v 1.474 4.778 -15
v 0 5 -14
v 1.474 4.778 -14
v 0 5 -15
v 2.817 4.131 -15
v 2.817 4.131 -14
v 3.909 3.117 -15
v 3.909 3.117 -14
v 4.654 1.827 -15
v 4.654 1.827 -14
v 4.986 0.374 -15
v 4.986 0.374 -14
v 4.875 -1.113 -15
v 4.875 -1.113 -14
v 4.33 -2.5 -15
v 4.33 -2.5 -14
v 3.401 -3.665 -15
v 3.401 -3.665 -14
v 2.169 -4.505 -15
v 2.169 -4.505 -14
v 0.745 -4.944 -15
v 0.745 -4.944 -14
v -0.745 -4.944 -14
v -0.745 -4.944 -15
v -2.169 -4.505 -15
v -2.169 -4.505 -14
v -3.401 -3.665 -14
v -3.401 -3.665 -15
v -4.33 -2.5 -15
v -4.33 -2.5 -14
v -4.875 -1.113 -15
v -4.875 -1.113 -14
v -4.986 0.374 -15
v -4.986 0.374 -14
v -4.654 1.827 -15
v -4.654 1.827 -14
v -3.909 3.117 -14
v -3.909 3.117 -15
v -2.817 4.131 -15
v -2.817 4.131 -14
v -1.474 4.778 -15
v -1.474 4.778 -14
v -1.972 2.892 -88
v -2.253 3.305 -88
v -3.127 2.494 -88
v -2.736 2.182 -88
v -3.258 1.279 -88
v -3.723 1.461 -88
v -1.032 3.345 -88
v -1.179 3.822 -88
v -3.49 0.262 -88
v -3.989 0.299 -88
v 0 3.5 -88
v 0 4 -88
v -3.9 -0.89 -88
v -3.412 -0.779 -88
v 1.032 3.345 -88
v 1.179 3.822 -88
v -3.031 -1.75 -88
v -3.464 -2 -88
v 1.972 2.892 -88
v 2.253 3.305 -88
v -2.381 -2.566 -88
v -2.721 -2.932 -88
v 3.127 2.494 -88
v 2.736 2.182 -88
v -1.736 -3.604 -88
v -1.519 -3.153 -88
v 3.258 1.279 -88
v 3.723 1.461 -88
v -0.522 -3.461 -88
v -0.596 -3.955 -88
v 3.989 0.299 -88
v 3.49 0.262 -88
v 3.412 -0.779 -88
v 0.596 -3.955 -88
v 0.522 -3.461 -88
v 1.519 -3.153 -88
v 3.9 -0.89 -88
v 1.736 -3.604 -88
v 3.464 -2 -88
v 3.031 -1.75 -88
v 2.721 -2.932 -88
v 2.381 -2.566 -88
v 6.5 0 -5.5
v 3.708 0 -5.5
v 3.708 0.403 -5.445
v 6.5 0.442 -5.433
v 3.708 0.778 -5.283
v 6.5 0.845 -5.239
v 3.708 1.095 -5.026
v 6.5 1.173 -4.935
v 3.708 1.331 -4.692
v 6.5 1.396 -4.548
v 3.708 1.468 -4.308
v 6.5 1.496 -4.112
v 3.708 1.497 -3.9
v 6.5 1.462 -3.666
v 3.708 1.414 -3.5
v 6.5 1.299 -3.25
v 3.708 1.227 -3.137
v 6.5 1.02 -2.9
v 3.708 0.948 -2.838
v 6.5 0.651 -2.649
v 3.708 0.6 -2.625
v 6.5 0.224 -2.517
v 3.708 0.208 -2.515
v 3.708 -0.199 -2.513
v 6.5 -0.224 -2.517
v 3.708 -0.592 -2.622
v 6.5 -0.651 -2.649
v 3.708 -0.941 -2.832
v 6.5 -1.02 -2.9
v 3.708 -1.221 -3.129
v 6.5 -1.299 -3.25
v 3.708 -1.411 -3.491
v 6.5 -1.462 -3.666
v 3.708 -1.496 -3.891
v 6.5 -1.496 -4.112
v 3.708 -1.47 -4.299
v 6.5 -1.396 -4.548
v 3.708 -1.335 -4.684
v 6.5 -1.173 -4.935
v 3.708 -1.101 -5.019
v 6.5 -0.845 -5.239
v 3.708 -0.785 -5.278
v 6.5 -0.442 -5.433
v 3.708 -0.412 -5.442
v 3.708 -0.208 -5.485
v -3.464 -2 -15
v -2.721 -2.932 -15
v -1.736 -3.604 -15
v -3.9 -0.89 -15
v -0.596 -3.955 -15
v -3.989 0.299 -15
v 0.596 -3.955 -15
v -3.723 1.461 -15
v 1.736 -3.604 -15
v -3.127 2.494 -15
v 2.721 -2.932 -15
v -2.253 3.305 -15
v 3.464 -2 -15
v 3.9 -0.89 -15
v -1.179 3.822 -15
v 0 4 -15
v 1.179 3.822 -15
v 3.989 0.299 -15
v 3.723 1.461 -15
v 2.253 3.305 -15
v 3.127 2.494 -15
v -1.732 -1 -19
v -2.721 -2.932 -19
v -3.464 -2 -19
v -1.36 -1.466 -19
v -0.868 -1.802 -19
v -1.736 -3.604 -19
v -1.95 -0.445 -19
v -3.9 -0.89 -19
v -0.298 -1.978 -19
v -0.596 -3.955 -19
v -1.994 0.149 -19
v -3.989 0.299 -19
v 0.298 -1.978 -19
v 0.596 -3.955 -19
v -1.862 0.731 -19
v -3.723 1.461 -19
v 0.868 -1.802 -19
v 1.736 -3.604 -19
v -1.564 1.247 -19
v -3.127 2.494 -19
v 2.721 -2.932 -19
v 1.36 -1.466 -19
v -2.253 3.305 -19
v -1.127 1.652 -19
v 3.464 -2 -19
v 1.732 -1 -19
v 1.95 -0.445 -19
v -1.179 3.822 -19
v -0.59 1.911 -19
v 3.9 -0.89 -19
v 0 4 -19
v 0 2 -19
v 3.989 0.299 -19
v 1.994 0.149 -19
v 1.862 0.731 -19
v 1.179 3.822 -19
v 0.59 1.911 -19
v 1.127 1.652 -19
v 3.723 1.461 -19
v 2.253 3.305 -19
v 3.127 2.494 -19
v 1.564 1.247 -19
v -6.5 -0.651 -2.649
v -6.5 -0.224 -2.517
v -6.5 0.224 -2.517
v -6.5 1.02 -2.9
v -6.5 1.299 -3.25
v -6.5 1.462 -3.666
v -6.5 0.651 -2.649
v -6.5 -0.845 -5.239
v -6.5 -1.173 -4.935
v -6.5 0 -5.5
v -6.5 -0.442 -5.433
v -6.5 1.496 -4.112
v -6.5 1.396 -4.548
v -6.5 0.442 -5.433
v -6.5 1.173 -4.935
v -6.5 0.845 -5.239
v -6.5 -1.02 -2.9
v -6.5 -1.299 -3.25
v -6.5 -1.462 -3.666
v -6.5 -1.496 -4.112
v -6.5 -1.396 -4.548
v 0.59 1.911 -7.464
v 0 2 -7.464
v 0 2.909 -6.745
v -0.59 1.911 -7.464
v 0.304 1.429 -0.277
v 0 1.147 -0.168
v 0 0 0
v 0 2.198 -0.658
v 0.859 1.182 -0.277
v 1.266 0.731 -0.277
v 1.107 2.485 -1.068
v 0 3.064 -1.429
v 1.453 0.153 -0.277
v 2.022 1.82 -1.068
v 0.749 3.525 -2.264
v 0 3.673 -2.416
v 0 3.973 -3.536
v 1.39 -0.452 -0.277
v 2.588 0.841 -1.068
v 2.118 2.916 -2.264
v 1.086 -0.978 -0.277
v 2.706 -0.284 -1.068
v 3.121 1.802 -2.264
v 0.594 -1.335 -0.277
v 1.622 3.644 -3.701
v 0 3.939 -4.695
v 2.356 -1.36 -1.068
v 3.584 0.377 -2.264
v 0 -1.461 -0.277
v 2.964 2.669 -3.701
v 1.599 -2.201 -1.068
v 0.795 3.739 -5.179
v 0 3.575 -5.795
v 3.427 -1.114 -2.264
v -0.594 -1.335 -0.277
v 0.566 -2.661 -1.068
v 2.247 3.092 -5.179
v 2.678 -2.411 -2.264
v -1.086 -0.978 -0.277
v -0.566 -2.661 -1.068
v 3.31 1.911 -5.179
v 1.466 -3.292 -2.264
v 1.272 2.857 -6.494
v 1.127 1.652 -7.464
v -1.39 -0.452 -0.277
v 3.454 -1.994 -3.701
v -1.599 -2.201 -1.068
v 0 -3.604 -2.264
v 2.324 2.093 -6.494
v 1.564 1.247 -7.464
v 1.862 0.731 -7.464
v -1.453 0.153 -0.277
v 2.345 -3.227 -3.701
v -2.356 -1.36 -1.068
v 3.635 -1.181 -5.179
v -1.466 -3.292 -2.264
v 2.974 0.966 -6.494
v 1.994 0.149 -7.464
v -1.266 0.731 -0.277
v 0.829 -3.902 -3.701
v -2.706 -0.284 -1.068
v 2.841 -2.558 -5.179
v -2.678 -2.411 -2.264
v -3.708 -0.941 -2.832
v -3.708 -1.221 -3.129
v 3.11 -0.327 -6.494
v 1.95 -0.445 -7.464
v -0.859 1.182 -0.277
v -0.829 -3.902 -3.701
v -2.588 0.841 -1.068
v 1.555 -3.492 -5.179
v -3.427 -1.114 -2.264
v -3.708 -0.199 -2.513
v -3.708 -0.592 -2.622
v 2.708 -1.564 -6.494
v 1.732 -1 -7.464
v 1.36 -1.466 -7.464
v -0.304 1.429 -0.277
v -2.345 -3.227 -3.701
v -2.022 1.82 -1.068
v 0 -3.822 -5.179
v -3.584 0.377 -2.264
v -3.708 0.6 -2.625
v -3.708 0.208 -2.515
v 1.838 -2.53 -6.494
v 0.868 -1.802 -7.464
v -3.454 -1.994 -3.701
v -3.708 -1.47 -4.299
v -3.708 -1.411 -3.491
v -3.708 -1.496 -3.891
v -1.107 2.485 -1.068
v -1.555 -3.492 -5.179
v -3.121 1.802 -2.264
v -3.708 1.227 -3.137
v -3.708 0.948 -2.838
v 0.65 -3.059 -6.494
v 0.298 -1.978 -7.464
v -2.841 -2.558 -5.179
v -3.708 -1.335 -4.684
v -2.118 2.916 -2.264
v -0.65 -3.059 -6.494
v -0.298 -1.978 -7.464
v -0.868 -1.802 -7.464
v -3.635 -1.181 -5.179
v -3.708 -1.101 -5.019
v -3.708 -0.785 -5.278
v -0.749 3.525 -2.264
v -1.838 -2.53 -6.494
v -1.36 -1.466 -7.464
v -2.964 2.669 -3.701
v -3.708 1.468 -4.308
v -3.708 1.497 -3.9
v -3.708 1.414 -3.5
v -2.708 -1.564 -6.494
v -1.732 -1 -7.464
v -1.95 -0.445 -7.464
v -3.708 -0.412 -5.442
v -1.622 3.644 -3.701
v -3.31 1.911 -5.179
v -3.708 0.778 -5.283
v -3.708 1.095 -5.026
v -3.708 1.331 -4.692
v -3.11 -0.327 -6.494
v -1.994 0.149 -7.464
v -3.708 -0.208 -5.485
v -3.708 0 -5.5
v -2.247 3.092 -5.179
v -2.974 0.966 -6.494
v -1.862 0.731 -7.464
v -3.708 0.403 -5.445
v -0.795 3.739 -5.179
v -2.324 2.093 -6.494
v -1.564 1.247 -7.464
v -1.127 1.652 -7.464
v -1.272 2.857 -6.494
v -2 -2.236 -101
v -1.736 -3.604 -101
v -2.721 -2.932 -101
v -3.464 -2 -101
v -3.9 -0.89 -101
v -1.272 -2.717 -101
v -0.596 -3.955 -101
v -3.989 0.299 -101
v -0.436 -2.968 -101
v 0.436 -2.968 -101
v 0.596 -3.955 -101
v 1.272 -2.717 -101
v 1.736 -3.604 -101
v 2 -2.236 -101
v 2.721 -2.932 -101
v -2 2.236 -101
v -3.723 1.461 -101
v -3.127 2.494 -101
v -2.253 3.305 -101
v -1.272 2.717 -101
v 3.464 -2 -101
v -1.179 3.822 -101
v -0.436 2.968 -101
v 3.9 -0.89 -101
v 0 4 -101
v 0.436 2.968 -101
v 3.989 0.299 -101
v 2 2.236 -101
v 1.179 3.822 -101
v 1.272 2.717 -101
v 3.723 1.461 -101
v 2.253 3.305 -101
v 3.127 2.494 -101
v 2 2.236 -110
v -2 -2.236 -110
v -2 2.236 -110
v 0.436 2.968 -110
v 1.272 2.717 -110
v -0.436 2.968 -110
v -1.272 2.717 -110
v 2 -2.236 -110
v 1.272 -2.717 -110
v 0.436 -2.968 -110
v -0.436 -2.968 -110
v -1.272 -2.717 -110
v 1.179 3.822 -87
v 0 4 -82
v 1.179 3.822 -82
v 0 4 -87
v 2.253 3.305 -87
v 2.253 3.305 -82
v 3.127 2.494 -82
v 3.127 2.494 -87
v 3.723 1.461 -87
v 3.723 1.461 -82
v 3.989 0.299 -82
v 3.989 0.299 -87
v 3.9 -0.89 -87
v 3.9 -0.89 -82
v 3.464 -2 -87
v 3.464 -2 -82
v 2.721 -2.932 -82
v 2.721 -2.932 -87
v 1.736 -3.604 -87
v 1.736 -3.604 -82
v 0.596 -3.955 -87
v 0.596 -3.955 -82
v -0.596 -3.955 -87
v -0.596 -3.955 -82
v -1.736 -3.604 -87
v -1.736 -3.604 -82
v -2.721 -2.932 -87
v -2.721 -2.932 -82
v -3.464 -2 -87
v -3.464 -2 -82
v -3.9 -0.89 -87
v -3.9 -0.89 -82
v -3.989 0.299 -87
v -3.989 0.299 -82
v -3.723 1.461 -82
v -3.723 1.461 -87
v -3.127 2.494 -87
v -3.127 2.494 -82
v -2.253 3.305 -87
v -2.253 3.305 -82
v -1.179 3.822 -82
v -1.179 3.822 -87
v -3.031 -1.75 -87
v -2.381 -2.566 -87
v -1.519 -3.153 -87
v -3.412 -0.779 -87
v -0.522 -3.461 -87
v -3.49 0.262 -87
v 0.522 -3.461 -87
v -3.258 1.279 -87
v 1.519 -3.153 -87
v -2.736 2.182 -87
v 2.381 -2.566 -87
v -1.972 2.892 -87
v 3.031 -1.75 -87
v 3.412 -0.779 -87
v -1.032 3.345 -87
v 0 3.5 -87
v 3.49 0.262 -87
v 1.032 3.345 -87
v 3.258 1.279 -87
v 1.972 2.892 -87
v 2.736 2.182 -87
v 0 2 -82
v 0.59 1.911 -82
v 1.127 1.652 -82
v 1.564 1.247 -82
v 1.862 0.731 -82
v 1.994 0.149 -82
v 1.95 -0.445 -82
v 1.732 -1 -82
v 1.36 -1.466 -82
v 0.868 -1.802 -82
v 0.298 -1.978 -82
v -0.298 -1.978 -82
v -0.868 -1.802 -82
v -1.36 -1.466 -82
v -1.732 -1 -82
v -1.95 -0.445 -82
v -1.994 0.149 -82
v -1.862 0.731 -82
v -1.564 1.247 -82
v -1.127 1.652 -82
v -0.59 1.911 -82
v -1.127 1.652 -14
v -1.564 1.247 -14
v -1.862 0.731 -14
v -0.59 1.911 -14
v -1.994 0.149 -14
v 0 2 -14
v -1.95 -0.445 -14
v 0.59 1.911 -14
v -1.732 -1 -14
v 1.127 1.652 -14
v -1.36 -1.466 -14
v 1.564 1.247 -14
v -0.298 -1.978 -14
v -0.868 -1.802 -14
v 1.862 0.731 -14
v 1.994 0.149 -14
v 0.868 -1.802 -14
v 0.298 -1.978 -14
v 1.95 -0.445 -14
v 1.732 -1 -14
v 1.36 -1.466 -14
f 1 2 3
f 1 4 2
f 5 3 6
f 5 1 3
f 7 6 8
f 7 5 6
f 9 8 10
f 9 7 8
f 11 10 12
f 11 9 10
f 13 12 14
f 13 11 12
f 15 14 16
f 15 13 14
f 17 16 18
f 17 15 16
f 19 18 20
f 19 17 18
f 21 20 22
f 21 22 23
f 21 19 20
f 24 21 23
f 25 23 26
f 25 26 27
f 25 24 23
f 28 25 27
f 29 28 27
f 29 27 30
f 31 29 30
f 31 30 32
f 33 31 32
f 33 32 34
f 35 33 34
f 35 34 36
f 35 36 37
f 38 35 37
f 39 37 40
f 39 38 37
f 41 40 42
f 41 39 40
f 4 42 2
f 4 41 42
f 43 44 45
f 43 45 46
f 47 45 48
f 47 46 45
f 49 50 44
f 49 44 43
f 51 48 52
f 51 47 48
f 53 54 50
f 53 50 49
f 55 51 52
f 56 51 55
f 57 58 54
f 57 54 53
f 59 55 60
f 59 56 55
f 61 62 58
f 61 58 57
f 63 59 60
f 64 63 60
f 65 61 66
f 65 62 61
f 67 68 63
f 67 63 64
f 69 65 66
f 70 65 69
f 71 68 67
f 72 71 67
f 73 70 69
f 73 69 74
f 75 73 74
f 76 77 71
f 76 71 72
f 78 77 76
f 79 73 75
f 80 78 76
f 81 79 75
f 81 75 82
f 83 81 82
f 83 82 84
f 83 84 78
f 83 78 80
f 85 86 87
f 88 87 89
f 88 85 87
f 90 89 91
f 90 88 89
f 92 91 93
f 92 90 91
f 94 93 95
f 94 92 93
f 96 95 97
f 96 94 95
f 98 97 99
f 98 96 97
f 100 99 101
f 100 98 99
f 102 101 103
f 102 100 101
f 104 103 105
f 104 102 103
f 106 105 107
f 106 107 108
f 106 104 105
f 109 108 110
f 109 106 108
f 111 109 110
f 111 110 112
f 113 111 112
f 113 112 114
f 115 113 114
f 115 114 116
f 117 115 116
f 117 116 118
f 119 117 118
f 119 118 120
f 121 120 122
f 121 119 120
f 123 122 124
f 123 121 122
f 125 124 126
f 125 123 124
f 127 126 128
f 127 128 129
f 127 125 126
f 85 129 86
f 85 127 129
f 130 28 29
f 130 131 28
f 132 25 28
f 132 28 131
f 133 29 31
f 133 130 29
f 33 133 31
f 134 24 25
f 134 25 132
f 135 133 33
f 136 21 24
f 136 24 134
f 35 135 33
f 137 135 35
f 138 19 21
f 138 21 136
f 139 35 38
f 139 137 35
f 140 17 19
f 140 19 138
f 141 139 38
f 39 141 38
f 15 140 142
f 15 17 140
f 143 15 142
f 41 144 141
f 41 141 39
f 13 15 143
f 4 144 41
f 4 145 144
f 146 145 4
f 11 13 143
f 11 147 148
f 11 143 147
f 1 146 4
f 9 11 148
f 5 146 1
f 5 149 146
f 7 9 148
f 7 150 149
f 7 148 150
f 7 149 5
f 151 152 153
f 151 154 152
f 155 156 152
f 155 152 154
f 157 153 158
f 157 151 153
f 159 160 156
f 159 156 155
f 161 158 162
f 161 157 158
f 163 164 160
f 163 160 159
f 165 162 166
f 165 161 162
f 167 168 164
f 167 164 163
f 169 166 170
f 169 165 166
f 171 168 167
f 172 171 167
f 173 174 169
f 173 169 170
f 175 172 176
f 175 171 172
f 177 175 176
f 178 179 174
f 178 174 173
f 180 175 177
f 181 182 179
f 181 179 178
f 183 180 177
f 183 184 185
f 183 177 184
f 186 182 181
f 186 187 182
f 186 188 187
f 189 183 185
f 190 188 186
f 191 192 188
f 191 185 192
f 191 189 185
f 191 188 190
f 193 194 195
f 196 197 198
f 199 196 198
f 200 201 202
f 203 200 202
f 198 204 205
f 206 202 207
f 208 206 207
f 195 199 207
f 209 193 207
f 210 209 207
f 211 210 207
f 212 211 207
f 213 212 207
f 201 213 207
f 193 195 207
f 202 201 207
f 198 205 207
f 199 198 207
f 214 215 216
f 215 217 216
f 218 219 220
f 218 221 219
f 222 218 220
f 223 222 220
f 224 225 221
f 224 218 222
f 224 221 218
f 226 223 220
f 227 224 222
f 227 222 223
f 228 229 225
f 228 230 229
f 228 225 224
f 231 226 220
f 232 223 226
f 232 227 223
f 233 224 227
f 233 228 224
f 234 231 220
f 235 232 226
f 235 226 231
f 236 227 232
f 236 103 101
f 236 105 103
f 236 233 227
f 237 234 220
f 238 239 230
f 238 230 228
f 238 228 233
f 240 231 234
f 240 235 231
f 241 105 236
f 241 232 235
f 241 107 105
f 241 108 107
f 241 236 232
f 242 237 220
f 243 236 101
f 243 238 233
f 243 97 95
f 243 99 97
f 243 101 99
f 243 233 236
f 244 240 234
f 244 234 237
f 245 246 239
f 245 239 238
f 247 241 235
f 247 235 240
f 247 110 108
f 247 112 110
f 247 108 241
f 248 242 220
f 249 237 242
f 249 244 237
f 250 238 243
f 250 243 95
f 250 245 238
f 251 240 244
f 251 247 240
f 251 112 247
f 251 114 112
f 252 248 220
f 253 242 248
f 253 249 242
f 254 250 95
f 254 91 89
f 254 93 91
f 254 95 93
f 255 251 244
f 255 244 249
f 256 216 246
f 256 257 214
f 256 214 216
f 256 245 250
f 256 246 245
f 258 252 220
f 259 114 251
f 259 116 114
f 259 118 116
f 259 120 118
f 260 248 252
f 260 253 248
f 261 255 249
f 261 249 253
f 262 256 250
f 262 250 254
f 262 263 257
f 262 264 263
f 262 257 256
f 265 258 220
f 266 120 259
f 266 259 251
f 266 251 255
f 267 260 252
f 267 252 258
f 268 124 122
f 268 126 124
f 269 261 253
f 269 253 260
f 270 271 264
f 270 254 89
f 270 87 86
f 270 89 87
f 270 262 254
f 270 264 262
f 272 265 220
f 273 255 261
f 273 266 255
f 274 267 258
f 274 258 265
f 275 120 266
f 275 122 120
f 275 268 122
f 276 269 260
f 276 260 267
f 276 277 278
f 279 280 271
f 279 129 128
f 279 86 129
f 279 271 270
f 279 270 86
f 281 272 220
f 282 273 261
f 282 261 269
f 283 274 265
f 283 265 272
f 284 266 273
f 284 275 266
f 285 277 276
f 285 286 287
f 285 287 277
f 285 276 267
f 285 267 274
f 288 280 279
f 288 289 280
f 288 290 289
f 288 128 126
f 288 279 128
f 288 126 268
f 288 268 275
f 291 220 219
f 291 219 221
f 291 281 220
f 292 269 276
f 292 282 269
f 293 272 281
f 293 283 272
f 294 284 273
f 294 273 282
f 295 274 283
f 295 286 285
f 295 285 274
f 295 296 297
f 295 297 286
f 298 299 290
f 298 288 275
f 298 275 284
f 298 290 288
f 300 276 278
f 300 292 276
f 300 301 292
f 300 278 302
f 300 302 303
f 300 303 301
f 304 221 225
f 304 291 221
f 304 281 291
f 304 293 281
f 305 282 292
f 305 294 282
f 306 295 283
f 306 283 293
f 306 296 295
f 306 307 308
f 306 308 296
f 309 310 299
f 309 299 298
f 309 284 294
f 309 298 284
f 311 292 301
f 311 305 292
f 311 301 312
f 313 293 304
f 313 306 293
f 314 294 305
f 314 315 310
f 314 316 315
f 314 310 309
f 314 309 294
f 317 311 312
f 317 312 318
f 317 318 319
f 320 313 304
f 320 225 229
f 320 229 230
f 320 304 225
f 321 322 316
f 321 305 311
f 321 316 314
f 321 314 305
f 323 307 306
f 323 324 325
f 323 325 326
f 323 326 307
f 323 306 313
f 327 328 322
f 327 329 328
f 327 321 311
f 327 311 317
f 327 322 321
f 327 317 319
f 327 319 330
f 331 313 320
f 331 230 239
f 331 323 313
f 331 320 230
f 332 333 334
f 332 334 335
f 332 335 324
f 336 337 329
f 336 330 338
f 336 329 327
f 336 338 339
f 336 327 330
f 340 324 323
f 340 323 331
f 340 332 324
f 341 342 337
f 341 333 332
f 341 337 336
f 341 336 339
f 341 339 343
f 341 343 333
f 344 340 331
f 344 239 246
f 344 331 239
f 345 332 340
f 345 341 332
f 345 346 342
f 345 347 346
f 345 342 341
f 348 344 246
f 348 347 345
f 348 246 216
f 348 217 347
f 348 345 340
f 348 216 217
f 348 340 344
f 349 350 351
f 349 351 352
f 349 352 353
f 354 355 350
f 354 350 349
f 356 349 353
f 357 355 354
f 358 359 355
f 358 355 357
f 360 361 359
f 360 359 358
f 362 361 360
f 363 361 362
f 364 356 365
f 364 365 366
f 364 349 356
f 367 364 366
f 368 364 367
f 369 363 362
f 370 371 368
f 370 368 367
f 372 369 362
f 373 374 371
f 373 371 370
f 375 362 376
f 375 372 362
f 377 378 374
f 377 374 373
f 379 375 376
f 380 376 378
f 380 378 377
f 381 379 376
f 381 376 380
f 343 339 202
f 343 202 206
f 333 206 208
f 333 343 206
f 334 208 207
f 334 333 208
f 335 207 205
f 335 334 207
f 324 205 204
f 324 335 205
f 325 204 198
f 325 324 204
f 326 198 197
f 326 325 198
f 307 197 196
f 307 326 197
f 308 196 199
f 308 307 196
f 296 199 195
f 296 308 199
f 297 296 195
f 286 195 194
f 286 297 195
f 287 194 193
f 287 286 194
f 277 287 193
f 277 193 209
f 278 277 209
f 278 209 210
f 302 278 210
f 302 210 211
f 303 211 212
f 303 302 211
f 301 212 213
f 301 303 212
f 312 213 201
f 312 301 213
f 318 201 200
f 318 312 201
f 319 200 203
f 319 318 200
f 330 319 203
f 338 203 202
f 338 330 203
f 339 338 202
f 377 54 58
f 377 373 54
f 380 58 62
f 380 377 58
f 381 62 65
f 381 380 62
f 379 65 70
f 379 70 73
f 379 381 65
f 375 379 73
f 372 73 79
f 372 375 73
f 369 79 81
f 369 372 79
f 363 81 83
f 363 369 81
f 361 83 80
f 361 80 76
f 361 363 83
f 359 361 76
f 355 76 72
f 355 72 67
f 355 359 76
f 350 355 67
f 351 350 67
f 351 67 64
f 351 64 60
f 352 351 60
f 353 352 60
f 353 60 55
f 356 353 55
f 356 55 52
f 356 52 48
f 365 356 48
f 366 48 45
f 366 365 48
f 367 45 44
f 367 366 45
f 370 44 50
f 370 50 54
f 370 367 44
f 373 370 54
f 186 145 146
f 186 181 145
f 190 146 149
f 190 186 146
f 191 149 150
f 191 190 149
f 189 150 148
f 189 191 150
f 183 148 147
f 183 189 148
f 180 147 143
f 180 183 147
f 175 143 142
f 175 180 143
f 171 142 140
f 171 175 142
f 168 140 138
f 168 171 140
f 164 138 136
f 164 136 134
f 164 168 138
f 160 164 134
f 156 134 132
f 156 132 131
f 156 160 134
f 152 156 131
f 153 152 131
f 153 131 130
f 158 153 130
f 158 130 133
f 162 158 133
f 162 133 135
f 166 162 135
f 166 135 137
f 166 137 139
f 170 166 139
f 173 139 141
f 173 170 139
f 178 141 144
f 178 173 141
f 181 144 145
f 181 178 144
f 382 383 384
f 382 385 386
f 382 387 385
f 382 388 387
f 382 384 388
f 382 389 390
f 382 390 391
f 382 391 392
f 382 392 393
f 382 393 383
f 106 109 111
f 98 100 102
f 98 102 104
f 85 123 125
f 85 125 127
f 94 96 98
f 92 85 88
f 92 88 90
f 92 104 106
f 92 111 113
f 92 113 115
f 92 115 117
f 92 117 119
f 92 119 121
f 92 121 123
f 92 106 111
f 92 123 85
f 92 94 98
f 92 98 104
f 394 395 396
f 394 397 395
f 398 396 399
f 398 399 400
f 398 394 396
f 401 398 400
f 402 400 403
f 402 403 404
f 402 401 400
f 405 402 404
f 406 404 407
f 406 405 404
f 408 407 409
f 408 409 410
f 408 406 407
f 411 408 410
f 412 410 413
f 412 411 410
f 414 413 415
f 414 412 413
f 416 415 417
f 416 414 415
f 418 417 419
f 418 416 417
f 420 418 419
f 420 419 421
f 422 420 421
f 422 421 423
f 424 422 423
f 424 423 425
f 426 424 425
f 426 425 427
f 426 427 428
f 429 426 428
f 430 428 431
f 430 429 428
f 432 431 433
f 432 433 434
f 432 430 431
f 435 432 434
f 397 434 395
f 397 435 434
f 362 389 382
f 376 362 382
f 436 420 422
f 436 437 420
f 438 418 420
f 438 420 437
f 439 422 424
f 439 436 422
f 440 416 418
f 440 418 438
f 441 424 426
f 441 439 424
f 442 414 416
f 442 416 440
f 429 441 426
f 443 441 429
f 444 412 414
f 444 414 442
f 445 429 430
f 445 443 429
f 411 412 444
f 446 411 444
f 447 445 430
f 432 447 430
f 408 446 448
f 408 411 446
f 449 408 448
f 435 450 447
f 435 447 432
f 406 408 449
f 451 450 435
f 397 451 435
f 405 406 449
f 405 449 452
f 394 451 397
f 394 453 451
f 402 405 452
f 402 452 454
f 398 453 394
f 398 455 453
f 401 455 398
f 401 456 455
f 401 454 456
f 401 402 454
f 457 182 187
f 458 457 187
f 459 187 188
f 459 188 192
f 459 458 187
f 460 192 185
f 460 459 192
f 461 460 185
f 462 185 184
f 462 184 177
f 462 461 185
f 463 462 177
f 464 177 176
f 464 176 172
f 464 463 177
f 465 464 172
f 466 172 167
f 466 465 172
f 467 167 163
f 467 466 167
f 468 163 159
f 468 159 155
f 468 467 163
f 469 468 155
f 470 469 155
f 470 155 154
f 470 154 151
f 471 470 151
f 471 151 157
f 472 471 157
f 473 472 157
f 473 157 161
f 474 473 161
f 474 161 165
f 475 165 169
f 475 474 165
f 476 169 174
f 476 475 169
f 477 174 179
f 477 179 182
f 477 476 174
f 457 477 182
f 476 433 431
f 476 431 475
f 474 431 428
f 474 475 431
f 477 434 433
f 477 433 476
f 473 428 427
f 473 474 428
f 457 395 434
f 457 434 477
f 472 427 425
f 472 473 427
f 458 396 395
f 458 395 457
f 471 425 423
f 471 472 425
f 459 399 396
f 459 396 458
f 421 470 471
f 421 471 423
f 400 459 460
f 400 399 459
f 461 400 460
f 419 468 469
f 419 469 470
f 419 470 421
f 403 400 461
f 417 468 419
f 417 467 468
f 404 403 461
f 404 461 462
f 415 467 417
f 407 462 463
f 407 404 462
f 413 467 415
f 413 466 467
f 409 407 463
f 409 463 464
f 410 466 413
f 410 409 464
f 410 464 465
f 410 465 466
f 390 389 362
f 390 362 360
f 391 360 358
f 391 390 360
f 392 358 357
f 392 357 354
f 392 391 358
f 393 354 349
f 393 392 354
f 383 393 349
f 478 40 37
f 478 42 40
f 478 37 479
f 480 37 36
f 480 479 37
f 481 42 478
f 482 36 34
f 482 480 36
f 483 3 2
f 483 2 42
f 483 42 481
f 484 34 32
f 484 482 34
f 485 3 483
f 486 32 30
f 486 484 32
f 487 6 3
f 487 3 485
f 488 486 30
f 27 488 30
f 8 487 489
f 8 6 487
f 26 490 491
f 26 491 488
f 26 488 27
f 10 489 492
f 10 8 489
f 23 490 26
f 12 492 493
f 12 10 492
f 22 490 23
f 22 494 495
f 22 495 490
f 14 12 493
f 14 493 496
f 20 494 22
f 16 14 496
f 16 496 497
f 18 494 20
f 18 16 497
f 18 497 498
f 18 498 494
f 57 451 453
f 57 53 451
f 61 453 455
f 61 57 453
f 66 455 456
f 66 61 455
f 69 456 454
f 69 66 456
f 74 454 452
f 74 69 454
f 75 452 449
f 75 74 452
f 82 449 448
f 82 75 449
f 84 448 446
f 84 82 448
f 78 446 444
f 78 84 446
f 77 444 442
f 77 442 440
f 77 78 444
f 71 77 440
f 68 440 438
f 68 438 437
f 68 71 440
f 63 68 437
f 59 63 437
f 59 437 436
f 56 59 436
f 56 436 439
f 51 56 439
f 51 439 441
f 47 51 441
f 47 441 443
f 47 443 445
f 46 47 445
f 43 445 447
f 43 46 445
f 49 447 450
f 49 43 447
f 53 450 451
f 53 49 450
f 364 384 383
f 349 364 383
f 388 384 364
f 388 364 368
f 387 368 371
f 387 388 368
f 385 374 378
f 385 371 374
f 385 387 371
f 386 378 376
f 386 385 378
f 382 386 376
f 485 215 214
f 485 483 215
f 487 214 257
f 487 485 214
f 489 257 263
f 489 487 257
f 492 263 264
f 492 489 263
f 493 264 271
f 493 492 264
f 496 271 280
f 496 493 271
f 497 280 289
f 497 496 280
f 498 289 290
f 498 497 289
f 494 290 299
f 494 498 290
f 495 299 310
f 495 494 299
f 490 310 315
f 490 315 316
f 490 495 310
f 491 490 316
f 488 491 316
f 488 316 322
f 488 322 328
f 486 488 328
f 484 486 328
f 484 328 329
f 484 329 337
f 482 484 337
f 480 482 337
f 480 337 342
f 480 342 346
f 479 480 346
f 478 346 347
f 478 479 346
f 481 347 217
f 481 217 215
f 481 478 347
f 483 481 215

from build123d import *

# Parameters (mm, degrees)
CUT_EXTRUDE1_DEPTH  = 9
SKETCH3_R           = 1.5
BOSS_EXTRUDE1_DEPTH = 6.5


with BuildPart() as part:
    # Sketch1 → Revolve1 (revolve)
    with BuildSketch(Plane(origin=(0, 0, 0), x_dir=(0, 0, -1), z_dir=(1, 0, 0))):
        with BuildLine():
            Line((7.464101615, 2), (14, 2))
            Line((14, 2), (14, 5))
            Line((14, 5), (15, 5))
            Line((15, 5), (15, 4))
            Line((15, 4), (19, 4))
            Line((19, 4), (19, 2))
            Line((19, 2), (82, 2))
            Line((82, 2), (82, 4))
            Line((82, 4), (87, 4))
            Line((87, 4), (87, 3.5))
            Line((87, 3.5), (88, 3.5))
            Line((88, 3.5), (88, 4))
            Line((88, 4), (101, 4))
            Line((101, 4), (101, 3))
            Line((101, 3), (110, 3))
            Line((110, 3), (110, 0))
            Line((110, 0), (0, 0))
            ThreePointArc((0, 0), (2.96472382, 3.863703305), (7.464101615, 2))
        make_face()
    revolve(axis=Axis((0, 0, 0), (0, 0, -1)))

    # Sketch2 → Cut-Extrude1 (cut)
    with BuildSketch(Plane(origin=(0, 0, -110), x_dir=(-1, 0, 0), z_dir=(0, 0, -1))):
        with BuildLine():
            ThreePointArc((-2, 2.236067977), (-3, 0), (-2, -2.236067977))
            Line((-2, -2.236067977), (-2, 2.236067977))
        make_face()
        with BuildLine():
            Line((2, 2.236067977), (2, -2.236067977))
            ThreePointArc((2, -2.236067977), (2.738612788, -1.224744871), (3, 0))
            ThreePointArc((3, 0), (2.738612788, 1.224744871), (2, 2.236067977))
        make_face()
    extrude(amount=-CUT_EXTRUDE1_DEPTH, mode=Mode.SUBTRACT)

    # Sketch3 → Boss-Extrude1 (add, symmetric)
    with BuildSketch(Plane(origin=(0, 0, 0), x_dir=(0, 0, -1), z_dir=(1, 0, 0))):
        with Locations((4, 0)):
            Circle(SKETCH3_R)
    extrude(amount=BOSS_EXTRUDE1_DEPTH, both=True)


solid = part.part
